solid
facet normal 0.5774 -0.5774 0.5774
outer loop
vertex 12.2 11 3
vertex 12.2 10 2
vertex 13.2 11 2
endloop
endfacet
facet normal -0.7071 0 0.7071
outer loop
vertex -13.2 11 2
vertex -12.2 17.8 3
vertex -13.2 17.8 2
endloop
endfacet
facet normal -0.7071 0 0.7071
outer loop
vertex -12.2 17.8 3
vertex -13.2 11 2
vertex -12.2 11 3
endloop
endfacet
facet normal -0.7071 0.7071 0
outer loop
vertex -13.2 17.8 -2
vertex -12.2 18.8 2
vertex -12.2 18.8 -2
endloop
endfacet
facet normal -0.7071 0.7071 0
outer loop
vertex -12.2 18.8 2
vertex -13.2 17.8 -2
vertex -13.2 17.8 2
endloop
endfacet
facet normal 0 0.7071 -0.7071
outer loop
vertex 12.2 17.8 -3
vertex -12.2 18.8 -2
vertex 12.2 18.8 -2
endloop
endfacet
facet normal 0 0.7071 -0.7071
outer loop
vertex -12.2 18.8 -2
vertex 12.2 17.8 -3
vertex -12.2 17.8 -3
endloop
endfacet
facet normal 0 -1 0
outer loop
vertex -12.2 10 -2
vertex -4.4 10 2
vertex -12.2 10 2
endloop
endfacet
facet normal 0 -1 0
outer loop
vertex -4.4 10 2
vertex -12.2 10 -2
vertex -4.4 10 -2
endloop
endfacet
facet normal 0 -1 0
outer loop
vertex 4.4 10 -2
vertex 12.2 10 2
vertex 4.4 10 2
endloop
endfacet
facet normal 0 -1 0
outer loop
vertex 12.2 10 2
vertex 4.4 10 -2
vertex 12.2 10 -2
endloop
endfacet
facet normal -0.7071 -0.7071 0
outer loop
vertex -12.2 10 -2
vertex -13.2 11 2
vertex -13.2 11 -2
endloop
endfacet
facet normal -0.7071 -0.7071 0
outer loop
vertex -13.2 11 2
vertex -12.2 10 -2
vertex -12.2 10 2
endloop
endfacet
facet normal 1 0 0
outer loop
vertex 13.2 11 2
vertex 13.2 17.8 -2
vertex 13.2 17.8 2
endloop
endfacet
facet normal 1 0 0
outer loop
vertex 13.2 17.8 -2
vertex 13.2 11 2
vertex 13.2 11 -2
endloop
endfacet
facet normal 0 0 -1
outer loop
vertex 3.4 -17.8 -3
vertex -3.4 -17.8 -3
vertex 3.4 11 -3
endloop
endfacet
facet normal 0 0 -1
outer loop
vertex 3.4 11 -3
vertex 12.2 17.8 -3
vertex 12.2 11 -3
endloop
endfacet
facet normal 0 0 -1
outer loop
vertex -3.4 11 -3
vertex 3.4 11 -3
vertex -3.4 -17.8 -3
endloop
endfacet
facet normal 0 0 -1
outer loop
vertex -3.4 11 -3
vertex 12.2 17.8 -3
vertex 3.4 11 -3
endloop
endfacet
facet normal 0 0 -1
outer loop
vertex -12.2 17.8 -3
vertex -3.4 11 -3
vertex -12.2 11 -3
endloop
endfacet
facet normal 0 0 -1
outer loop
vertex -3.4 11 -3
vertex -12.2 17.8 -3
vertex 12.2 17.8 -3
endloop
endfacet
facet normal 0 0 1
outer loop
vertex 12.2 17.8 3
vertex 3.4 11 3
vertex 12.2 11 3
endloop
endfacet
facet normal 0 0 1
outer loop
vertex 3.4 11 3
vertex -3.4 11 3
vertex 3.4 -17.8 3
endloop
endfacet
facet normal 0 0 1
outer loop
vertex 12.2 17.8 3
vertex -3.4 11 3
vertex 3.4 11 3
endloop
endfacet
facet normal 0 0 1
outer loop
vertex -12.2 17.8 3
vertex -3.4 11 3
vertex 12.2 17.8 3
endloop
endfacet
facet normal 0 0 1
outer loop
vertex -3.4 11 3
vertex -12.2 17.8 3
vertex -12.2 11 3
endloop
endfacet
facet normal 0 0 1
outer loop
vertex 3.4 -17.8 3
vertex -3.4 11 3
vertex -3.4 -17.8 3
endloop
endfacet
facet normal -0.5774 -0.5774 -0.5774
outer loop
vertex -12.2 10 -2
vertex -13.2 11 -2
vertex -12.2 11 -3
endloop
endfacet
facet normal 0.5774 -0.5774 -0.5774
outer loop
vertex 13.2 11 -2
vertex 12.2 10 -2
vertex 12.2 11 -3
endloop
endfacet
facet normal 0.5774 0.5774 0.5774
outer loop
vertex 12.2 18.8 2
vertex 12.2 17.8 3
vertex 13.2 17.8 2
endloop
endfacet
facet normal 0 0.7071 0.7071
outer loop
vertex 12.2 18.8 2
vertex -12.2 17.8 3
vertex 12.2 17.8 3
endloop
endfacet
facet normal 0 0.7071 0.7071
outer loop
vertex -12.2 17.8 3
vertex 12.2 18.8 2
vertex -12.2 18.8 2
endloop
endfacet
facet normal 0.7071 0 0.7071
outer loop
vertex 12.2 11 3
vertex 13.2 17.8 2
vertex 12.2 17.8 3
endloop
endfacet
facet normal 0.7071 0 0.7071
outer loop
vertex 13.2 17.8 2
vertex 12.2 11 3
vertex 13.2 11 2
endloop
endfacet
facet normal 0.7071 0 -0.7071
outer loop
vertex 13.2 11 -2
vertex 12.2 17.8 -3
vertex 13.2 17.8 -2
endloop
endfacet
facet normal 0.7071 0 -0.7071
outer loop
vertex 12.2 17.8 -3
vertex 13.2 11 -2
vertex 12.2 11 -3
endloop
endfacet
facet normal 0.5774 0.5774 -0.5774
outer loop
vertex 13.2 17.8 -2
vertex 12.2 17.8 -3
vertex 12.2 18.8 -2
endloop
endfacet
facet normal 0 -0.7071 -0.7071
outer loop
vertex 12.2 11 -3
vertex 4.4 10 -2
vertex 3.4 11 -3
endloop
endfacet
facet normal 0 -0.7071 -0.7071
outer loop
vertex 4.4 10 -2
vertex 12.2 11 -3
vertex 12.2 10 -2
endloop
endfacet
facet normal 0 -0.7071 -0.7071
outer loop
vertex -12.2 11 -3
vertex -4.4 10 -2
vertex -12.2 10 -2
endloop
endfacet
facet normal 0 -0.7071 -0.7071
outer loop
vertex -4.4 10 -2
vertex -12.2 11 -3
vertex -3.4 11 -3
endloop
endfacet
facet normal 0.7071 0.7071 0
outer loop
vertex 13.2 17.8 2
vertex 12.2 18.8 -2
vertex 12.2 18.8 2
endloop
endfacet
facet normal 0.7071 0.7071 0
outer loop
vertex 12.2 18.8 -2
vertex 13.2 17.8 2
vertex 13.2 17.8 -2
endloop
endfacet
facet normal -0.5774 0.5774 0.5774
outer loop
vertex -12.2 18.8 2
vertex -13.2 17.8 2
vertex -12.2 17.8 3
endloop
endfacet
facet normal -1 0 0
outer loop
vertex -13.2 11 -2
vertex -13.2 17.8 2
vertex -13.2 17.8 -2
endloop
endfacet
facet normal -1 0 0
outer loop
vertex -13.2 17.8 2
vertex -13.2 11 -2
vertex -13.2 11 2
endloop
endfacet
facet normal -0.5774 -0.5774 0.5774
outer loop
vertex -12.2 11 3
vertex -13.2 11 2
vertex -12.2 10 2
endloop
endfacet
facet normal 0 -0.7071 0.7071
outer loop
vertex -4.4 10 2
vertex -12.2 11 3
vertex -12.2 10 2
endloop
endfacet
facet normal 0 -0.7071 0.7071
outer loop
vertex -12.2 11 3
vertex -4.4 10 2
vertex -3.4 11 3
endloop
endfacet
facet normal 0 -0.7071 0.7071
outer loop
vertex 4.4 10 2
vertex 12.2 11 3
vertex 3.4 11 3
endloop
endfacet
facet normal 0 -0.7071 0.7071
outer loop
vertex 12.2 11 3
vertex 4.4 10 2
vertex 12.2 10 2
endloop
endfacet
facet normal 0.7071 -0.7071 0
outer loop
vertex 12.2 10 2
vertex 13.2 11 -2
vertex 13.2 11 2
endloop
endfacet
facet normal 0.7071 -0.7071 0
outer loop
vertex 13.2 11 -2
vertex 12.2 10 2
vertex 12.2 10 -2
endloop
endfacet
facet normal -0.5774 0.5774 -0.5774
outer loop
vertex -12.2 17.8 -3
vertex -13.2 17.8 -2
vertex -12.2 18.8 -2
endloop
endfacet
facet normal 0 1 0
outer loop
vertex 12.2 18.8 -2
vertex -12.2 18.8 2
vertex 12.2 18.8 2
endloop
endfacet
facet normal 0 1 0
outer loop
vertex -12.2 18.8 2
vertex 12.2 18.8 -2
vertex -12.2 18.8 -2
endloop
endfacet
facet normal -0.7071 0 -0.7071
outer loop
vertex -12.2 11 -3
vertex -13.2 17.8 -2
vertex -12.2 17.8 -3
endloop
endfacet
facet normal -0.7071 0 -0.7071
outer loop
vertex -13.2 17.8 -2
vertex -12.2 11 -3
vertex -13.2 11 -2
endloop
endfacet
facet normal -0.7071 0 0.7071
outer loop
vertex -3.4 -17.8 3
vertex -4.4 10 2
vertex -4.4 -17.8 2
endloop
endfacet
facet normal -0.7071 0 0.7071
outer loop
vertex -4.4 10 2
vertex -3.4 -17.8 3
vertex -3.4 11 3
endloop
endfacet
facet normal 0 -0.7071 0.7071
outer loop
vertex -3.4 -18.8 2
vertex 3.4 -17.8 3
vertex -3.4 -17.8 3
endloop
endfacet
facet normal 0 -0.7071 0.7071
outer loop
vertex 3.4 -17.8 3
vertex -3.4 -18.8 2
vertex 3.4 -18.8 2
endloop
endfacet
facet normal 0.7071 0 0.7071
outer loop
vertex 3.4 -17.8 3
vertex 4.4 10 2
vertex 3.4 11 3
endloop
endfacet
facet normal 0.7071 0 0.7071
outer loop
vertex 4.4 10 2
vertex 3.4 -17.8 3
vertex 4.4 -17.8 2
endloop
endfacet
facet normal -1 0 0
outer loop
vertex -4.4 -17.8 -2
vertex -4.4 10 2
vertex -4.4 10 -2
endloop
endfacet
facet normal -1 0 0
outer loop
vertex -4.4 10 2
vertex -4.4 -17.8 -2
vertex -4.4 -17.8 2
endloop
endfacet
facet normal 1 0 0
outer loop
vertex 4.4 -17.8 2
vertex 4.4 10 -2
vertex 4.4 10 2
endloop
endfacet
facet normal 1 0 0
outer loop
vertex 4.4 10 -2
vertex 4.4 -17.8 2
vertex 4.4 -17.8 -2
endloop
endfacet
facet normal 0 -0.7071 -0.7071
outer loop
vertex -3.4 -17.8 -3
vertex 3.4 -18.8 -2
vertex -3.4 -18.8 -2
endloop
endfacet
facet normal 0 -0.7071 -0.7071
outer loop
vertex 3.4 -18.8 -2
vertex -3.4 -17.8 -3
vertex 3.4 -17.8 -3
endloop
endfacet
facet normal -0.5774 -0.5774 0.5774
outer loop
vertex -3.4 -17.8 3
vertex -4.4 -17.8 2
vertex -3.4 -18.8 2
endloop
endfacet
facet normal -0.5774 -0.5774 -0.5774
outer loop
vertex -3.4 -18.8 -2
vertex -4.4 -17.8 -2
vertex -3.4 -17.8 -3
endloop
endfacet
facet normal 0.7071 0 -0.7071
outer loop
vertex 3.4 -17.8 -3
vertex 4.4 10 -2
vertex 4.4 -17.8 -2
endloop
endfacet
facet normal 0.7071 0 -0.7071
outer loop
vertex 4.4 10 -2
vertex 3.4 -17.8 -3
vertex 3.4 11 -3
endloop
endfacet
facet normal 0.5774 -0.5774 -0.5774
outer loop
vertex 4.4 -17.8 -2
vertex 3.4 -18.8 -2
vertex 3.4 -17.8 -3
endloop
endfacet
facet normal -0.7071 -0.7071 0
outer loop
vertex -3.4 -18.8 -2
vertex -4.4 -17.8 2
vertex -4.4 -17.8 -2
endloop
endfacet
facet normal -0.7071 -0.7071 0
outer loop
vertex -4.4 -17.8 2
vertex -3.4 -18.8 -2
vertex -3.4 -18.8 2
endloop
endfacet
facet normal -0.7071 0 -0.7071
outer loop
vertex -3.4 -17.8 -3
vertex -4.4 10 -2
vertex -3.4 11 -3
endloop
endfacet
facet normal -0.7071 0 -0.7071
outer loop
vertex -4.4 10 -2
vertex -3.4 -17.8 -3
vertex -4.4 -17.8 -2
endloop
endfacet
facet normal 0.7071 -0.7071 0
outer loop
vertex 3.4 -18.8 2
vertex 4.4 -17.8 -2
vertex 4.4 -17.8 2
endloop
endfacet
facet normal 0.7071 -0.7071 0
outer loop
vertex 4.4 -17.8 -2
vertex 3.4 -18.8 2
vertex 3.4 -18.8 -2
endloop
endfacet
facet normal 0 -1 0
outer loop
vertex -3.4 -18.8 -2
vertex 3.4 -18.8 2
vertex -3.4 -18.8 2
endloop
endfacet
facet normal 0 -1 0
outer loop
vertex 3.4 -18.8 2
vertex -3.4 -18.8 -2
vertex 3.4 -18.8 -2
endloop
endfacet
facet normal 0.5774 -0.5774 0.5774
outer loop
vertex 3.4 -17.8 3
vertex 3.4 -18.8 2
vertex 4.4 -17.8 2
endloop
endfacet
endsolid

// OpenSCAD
/* * * * * * * * * * * * * * * * * * * * * * * * * * * * * * * * * * * * *\
 * Copyright (C) Claus Schrammel <claus@f05fk.net>                       *
 *                                                                       *
 * This program is free software: you can redistribute it and/or modify  *
 * it under the terms of the GNU General Public License as published by  *
 * the Free Software Foundation, either version 3 of the License, or     *
 * (at your option) any later version.                                   *
 *                                                                       *
 * This program is distributed in the hope that it will be useful,       *
 * but WITHOUT ANY WARRANTY; without even the implied warranty of        *
 * MERCHANTABILITY or FITNESS FOR A PARTICULAR PURPOSE.  See the         *
 * GNU General Public License for more details.                          *
 *                                                                       *
 * You should have received a copy of the GNU General Public License     *
 * along with this program.  If not, see <http://www.gnu.org/licenses/>. *
 *                                                                       *
 * SPDX-License-Identifier: GPL-3.0-or-later                             *
\* * * * * * * * * * * * * * * * * * * * * * * * * * * * * * * * * * * * */
$fn = 120;

union() {
    translate([0, 14.4, 0])
    CubeChamfered([26.4, 8.8, 6], 1, center = true);
    CubeChamfered([8.8, 37.6, 6], 1, center = true);
}

*union() {
    translate([0, 33.8, 0])
    CubeChamfered([80, 12.4, 7], 1, center = true);
    translate([0, -33.8, 0])
    CubeChamfered([80, 12.4, 7], 1, center = true);
    translate([33.8, 0, 0])
    CubeChamfered([12.3, 80, 7], 1, center = true);
    translate([-33.8, 0, 0])
    CubeChamfered([12.3, 80, 7], 1, center = true);
    translate([0, 0, -3])
    hull() {
        cube([78, 80, 1], center = true);
        cube([80, 78, 1], center = true);
    }
}

*union() {
    translate([0, 32.5, 0])
    CubeChamfered([80, 15, 7], 1, center = true);
    translate([0, -32.5, 0])
    CubeChamfered([80, 15, 7], 1, center = true);
    translate([32.5, 0, 0])
    CubeChamfered([15, 80, 7], 1, center = true);
    translate([-32.5, 0, 0])
    CubeChamfered([15, 80, 7], 1, center = true);
    translate([0, 0, -3])
    hull() {
        cube([78, 80, 1], center = true);
        cube([80, 78, 1], center = true);
    }
}

module CubeChamfered(size, d, center = false) {
    pos = center == true ? [0, 0, 0] : [size.x / 2, size.y / 2, size.z / 2];
    hull() {
        translate([pos.x, pos.y, pos.z]) {
           cube([size.x, size.y - 2 * d, size.z - 2 * d], center = true);
           cube([size.x - 2 * d, size.y, size.z - 2 * d], center = true);
           cube([size.x - 2 * d, size.y - 2 * d, size.z], center = true);
        }
    }
}
